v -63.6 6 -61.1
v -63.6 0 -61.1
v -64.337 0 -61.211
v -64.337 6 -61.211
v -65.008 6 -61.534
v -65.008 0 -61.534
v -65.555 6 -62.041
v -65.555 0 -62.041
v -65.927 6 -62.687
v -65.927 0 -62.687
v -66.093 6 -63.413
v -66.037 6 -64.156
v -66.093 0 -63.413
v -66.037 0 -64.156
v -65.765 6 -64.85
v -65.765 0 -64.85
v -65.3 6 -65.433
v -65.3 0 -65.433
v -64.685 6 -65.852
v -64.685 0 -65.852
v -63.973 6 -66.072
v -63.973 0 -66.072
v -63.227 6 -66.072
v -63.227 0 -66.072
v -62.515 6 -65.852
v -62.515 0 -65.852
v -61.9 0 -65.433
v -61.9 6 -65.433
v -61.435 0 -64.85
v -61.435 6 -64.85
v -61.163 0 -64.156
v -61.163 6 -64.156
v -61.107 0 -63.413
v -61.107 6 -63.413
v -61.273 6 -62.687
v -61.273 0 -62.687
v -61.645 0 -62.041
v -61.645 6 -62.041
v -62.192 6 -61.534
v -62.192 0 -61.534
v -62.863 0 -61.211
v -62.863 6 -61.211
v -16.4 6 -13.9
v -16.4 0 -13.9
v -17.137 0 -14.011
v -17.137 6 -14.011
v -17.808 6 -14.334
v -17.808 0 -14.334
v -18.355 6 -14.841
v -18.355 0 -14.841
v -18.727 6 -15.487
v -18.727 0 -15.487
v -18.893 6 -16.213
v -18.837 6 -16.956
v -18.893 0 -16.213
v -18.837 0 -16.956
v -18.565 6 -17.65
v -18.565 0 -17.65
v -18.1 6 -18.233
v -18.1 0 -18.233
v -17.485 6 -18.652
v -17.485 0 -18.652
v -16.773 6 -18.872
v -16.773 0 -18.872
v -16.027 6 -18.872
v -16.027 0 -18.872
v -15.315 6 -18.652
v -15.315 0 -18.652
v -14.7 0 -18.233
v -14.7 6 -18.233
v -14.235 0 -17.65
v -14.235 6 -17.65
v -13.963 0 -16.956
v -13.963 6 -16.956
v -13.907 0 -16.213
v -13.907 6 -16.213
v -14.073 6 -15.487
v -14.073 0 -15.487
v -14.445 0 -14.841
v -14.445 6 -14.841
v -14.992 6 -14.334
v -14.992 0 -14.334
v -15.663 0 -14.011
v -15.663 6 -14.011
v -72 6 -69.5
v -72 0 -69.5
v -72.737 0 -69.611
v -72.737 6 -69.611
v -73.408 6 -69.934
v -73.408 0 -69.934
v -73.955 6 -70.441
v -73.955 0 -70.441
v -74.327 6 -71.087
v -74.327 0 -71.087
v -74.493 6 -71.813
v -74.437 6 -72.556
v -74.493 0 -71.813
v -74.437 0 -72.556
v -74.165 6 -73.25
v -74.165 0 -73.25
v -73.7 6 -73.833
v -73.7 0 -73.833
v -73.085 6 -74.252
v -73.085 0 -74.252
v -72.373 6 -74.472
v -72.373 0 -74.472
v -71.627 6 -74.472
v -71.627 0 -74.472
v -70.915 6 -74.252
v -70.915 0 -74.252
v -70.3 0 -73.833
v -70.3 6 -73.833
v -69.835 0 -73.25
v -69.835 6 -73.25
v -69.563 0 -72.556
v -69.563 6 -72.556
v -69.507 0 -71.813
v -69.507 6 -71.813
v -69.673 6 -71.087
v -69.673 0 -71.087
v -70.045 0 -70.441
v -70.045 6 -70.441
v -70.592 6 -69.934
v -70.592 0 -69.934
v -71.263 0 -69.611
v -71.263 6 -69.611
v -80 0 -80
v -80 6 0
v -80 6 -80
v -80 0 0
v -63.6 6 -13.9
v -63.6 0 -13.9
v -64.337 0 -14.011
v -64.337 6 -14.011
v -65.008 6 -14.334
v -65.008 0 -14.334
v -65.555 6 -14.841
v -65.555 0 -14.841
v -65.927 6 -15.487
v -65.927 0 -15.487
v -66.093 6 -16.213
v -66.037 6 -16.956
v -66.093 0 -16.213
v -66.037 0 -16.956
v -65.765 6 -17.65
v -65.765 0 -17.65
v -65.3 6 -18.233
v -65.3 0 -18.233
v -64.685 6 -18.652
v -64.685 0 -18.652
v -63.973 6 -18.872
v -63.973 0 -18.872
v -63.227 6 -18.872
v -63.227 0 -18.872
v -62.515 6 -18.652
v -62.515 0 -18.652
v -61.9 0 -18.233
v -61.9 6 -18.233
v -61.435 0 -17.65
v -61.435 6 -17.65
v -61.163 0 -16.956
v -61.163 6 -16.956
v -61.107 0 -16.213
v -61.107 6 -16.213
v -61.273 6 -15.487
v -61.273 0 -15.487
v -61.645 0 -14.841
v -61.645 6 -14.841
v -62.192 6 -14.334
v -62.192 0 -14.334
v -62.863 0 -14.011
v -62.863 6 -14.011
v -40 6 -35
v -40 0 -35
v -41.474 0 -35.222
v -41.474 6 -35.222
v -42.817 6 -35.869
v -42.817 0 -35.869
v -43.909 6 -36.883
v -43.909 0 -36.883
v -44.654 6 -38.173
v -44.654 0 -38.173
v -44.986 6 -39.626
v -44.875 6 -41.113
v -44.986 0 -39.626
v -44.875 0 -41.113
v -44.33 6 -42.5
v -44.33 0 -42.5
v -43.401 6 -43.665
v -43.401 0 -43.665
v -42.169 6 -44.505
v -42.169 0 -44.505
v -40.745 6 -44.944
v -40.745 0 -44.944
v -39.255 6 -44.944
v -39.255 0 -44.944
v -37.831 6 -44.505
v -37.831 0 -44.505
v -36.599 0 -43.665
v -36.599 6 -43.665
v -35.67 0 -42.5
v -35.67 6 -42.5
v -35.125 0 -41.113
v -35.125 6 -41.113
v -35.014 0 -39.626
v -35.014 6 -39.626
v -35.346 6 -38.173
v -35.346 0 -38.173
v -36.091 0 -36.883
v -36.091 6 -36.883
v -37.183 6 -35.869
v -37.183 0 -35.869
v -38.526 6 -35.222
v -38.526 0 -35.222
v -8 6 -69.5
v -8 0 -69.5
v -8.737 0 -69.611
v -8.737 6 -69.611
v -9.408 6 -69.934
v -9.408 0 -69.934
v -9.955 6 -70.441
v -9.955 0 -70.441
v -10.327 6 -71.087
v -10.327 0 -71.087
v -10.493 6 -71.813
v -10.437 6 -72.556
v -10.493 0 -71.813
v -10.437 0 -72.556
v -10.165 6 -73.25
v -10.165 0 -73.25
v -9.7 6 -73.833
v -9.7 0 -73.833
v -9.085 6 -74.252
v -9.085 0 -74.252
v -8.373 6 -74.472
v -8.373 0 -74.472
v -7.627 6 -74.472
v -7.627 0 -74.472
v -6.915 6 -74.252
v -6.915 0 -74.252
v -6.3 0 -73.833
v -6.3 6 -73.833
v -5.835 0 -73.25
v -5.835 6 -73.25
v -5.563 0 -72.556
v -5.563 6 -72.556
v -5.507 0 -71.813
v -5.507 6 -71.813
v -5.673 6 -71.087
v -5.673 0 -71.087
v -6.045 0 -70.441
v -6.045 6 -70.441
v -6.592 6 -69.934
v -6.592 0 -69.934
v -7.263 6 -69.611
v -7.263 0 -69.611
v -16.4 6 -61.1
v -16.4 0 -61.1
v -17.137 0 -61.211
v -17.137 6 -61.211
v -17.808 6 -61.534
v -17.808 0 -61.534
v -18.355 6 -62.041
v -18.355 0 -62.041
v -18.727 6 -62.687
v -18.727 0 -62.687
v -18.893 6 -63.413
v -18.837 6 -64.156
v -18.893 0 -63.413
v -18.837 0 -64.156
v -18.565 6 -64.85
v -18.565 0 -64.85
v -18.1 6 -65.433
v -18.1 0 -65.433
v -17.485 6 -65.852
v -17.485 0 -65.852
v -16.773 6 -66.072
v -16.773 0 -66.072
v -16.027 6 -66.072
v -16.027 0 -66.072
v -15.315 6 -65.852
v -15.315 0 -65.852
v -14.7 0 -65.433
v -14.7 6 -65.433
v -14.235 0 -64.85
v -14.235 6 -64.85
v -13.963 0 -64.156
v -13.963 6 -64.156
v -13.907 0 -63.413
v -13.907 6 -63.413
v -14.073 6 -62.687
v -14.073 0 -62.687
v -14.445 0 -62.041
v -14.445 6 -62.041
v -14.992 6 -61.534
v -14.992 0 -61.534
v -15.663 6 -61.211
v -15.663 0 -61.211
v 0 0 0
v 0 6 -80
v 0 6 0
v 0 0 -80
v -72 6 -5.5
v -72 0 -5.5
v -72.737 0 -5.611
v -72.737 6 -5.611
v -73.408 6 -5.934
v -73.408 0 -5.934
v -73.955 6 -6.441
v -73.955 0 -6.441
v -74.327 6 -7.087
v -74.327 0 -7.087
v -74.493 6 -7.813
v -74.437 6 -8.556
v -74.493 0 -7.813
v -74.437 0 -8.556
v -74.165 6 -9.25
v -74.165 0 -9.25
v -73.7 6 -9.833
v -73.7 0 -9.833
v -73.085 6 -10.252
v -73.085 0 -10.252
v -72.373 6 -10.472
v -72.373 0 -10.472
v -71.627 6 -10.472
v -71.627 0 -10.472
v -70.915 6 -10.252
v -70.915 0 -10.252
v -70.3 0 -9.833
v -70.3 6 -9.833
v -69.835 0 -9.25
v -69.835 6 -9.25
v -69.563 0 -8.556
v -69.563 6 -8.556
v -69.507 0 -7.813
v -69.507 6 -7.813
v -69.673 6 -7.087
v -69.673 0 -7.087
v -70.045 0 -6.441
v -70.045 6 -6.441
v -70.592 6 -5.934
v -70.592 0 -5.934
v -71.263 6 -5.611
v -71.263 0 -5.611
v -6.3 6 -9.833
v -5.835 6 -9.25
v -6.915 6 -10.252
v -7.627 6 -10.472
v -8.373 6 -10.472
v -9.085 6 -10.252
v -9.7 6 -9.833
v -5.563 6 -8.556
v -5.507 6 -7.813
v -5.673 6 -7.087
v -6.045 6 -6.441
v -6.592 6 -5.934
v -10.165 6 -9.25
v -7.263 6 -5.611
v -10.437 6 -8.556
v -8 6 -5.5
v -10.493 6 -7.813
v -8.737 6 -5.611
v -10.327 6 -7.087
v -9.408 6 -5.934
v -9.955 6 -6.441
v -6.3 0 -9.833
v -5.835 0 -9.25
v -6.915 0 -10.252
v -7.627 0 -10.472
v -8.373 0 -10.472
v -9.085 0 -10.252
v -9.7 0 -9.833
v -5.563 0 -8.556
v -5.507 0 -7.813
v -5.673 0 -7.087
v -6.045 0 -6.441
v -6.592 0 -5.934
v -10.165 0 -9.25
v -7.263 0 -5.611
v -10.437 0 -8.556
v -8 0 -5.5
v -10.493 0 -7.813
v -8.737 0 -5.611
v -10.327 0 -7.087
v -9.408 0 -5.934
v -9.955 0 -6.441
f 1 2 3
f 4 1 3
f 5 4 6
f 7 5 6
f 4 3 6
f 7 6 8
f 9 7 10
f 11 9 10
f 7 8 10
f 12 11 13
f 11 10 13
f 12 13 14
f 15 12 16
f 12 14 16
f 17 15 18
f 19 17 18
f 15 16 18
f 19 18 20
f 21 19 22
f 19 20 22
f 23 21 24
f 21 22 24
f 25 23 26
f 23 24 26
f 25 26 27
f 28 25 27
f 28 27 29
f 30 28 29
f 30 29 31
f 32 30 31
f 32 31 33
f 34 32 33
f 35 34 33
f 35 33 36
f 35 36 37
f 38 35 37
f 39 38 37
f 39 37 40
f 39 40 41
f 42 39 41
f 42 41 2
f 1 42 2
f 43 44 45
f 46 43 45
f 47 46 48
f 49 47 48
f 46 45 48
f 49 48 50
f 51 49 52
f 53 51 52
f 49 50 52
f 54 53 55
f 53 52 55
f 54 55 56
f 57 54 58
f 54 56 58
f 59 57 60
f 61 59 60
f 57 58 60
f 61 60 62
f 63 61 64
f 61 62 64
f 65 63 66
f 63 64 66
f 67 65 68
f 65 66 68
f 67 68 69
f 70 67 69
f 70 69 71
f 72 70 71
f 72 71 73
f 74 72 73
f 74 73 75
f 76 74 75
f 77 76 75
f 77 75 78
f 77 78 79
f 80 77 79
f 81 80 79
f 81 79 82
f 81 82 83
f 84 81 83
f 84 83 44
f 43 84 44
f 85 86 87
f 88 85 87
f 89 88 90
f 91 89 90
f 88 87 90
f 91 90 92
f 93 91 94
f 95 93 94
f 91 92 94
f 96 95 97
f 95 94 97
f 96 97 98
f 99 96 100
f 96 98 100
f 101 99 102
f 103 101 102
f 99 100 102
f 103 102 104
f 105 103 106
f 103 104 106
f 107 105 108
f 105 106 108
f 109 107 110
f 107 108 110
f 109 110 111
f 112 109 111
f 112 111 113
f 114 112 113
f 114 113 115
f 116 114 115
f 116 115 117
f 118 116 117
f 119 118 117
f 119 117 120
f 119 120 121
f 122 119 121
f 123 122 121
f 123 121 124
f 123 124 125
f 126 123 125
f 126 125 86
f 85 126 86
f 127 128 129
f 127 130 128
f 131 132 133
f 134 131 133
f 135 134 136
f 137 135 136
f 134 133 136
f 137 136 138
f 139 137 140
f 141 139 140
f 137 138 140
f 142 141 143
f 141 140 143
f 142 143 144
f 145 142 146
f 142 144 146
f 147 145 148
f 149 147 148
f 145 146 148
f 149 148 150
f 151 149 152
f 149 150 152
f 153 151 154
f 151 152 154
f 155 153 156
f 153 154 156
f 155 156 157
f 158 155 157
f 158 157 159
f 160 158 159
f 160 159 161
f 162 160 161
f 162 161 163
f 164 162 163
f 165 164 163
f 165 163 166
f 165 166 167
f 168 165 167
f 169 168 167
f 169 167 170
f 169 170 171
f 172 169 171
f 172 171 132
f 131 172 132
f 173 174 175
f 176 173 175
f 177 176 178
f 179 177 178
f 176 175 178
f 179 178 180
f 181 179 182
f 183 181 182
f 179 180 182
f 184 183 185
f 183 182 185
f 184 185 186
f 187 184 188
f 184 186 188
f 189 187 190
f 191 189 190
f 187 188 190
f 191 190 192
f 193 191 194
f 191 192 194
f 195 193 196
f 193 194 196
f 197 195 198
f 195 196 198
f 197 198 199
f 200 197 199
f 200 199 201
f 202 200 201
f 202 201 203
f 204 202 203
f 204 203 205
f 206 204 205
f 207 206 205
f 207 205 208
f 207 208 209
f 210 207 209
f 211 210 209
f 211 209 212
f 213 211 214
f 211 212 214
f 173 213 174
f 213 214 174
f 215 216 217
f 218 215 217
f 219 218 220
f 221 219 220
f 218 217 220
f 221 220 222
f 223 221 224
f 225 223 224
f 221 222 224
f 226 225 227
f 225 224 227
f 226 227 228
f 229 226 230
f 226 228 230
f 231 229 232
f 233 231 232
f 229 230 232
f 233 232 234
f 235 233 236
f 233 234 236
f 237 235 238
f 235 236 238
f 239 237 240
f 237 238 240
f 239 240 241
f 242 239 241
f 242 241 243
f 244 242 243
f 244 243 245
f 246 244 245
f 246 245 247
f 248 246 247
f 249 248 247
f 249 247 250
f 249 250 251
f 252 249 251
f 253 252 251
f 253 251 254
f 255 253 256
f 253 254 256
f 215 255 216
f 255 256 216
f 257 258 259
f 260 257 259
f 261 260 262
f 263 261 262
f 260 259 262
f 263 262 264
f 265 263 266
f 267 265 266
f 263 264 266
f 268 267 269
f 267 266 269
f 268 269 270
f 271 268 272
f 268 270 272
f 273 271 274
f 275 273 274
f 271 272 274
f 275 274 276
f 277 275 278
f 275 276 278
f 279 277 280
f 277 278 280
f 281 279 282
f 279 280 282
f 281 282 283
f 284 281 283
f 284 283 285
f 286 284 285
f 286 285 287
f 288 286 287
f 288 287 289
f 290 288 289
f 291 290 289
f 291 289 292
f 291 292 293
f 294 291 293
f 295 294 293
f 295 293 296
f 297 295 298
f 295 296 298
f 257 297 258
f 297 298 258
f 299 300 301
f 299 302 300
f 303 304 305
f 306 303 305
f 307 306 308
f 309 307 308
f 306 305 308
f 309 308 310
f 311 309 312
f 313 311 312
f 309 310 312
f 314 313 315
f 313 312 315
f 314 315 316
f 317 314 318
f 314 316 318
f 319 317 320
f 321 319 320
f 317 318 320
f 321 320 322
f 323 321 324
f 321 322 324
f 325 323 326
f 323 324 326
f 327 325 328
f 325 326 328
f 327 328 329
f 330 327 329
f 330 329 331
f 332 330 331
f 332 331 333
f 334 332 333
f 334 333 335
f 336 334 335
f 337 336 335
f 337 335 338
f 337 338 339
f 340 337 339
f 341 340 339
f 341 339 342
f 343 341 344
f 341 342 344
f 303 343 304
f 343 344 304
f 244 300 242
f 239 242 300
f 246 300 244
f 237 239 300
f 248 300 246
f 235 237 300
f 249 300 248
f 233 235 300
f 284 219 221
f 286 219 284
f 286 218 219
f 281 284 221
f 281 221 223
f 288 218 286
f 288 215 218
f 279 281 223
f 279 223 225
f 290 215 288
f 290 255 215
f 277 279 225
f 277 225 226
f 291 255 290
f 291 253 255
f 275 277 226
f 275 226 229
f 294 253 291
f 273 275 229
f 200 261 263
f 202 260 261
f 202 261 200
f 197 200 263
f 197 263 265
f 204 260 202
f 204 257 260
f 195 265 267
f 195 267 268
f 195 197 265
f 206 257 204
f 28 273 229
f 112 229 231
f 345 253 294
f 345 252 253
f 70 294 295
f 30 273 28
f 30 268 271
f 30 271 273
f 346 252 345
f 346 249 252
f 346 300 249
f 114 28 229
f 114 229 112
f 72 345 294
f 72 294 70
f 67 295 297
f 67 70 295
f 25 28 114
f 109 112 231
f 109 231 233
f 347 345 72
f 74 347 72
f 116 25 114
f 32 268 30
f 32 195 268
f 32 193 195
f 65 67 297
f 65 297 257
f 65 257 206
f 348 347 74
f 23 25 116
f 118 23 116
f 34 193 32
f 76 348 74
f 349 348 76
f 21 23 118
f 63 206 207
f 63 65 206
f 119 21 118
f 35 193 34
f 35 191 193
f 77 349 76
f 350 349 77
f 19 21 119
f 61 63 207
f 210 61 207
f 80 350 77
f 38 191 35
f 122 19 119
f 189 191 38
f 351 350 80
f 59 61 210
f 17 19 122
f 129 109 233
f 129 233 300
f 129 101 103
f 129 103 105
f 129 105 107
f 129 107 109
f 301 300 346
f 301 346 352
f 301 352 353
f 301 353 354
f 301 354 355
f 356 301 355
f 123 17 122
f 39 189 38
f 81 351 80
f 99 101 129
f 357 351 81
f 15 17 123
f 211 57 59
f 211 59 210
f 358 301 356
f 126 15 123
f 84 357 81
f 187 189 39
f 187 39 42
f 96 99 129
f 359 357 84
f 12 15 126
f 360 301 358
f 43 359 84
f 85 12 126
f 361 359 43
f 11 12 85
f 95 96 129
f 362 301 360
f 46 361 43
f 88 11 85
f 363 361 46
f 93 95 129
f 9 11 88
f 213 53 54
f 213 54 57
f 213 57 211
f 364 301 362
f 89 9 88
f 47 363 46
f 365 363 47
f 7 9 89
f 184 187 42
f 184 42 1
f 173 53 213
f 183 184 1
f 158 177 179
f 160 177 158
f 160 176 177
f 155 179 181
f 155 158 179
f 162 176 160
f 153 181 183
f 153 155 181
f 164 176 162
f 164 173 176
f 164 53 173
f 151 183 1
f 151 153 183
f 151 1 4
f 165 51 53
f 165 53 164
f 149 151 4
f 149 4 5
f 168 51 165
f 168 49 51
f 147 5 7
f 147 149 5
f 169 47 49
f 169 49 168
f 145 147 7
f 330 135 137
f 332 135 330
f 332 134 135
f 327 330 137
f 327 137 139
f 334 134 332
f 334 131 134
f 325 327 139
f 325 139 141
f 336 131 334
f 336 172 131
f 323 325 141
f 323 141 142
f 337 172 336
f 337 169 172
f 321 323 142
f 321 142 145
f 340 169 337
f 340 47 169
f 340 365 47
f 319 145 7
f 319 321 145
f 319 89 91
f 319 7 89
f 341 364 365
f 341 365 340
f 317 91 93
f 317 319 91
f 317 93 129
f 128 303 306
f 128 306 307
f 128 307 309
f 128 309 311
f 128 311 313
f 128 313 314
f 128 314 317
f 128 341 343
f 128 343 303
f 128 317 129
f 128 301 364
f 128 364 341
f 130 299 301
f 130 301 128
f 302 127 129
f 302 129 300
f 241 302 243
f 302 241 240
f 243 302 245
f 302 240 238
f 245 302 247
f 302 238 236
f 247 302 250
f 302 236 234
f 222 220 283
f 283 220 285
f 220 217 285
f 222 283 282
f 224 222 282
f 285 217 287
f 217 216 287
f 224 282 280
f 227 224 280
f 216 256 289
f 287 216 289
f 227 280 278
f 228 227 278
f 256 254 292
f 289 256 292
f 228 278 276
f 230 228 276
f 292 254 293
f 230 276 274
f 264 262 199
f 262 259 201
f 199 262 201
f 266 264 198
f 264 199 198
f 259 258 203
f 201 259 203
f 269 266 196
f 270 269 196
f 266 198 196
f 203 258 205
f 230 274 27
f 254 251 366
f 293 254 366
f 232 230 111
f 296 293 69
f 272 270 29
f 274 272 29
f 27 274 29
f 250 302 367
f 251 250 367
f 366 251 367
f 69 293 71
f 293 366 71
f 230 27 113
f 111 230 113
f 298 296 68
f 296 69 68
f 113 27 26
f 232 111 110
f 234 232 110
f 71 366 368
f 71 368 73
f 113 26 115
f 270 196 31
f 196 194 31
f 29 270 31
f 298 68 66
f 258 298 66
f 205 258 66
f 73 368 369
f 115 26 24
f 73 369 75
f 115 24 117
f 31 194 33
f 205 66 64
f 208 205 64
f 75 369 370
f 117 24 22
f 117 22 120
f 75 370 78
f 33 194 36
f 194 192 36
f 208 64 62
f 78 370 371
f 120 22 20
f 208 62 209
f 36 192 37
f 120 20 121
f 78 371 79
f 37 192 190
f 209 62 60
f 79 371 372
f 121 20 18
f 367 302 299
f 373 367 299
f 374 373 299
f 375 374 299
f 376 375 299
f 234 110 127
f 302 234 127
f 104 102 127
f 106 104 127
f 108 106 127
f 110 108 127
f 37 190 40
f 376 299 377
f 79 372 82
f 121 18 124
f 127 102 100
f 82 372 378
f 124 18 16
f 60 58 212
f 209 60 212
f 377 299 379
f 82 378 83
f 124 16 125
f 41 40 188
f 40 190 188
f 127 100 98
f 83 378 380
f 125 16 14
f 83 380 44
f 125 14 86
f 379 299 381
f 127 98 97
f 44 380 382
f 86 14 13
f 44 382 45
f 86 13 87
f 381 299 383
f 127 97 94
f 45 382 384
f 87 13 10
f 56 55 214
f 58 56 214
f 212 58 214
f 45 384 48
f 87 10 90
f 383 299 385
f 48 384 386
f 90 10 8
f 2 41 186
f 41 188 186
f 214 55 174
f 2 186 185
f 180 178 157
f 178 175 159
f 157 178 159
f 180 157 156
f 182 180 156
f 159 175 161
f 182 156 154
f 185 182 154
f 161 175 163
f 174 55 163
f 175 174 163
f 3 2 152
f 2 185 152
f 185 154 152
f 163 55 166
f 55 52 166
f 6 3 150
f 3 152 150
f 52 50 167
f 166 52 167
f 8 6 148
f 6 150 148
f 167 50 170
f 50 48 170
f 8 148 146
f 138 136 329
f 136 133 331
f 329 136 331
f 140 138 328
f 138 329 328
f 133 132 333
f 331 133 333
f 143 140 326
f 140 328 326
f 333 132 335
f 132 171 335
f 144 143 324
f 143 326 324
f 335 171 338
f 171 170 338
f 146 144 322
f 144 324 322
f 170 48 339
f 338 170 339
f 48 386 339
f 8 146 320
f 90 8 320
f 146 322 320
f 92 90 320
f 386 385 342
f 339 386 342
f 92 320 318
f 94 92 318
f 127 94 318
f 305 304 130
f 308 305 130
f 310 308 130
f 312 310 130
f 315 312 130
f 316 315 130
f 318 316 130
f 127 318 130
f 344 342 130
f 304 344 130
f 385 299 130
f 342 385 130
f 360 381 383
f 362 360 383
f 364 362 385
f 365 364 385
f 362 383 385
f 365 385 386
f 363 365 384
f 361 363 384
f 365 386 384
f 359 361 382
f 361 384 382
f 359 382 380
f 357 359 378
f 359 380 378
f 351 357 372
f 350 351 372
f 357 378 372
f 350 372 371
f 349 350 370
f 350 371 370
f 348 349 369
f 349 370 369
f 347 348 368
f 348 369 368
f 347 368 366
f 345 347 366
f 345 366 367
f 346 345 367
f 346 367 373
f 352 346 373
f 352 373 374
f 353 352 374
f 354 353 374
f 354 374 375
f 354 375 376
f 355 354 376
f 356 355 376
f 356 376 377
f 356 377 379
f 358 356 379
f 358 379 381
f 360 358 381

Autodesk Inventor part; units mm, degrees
ref_plane "YZ Plane" through (0, 0, 0) normal (1, 0, 0) x (0, 1, 0)
ref_plane "XZ Plane" through (0, 0, 0) normal (0, 1, 0) x (-1, 0, 0)
ref_plane "XY Plane" through (0, 0, 0) normal (0, 0, 1) x (1, 0, 0)
sketch "Esboço1" plane through (0, 0, 0) normal (0, 1, 0) x (-1, 0, 0)
  line L0 (0, 0) -> (80, 0)
  line L1 (80, 0) -> (80, -80)
  line L2 (80, -80) -> (0, -80)
  line L3 (0, -80) -> (0, 0)
  dimension "d0" = 80
  dimension "d1" = 80
extrude "Extrusão1" add sketch "Esboço1" along normal blind 6
sketch "Esboço2" plane through (0, 6, 0) normal (0, 1, 0) x (1, 0, 0)
  line L0 (-80, 0) -> (0, 0) projected
  line L1 (0, 0) -> (0, 80) projected
  point P0 (-16.4, 16.4)
  point P1 (-16.4, 63.6)
  point P2 (-63.6, 63.6)
  point P3 (-63.6, 16.4)
  dimension "d4" = 47.2
  dimension "d5" = 47.2
  dimension "d6" = 47.2
  dimension "d7" = 47.2
  dimension "d8" = 0
  dimension "d9" = 0
  dimension "d10" = 80
  dimension "d11" = 16.4
  dimension "d12" = 16.4
hole "Furo1" at (-16.4, 6, -16.4) at (-16.4, 6, -63.6) at (-63.6, 6, -63.6) at (-63.6, 6, -16.4) direction (0, -1, 0) diameter 5 depth 6
sketch "Esboço3" plane through (0, 6, 0) normal (0, 1, 0) x (1, 0, 0)
  line L0 (-80, 0) -> (0, 0) projected
  line L1 (-80, 80) -> (-80, 0) projected
  line L2 (0, 0) -> (0, 80) projected
  line L3 (0, 80) -> (-80, 80) projected
  point P0 (-8, 8)
  point P1 (-8, 72)
  point P2 (-72, 72)
  point P3 (-72, 8)
  dimension "d20" = 8
  dimension "d21" = 8
  dimension "d22" = 8
  dimension "d23" = 8
  dimension "d24" = 8
  dimension "d25" = 8
  dimension "d26" = 8
  dimension "d27" = 8
hole "Furo2" at (-8, 6, -8) at (-8, 6, -72) at (-72, 6, -72) at (-72, 6, -8) direction (0, -1, 0) diameter 5 depth 6
sketch "Esboço4" plane through (0, 6, 0) normal (0, 1, 0) x (1, 0, 0)
  line L0 (-80, 80) -> (-80, 0) projected
  line L1 (-80, 0) -> (0, 0) projected
  point P0 (-40, 40)
  dimension "d35" = 80
  dimension "d36" = 40
  dimension "d37" = 40
hole "Furo3" at (-40, 6, -40) direction (0, -1, 0) diameter 10 depth 6
equation "\"d11\" = -0.5 * d4 + 0.5 * d10"
equation "\"d12\" = d11"
equation "\"d18\" = Espessura"
equation "\"d22\" = d21"
equation "\"d23\" = d20"
equation "\"d24\" = d21"
equation "\"d25\" = d20"
equation "\"d26\" = d25"
equation "\"d27\" = d23"
equation "\"d36\" = 0.5 * d35"
equation "\"d37\" = d36"
equation "\"Raio_vergadura\" = Espessura"
equation "\"Largura_alívio_de_vergadura\" = Espessura"
equation "\"Profundidade_alívio_de_vergadura\" = 0.5 * Espessura"
equation "\"Tamanho_alívio_de_dobra\" = 4 * Espessura"
equation "\"Remanescente_mínimo\" = 2 * Espessura"
equation "\"Raiodetransição\" = Raio_vergadura"
equation "\"Tamanho_de_raio_de_Jacobi\" = Raio_vergadura"
equation "\"TamanhoFolga\" = Espessura"
equation "\"Espessura\" = 0.5"
properties part number "Suporte do motor" material "Steel"
